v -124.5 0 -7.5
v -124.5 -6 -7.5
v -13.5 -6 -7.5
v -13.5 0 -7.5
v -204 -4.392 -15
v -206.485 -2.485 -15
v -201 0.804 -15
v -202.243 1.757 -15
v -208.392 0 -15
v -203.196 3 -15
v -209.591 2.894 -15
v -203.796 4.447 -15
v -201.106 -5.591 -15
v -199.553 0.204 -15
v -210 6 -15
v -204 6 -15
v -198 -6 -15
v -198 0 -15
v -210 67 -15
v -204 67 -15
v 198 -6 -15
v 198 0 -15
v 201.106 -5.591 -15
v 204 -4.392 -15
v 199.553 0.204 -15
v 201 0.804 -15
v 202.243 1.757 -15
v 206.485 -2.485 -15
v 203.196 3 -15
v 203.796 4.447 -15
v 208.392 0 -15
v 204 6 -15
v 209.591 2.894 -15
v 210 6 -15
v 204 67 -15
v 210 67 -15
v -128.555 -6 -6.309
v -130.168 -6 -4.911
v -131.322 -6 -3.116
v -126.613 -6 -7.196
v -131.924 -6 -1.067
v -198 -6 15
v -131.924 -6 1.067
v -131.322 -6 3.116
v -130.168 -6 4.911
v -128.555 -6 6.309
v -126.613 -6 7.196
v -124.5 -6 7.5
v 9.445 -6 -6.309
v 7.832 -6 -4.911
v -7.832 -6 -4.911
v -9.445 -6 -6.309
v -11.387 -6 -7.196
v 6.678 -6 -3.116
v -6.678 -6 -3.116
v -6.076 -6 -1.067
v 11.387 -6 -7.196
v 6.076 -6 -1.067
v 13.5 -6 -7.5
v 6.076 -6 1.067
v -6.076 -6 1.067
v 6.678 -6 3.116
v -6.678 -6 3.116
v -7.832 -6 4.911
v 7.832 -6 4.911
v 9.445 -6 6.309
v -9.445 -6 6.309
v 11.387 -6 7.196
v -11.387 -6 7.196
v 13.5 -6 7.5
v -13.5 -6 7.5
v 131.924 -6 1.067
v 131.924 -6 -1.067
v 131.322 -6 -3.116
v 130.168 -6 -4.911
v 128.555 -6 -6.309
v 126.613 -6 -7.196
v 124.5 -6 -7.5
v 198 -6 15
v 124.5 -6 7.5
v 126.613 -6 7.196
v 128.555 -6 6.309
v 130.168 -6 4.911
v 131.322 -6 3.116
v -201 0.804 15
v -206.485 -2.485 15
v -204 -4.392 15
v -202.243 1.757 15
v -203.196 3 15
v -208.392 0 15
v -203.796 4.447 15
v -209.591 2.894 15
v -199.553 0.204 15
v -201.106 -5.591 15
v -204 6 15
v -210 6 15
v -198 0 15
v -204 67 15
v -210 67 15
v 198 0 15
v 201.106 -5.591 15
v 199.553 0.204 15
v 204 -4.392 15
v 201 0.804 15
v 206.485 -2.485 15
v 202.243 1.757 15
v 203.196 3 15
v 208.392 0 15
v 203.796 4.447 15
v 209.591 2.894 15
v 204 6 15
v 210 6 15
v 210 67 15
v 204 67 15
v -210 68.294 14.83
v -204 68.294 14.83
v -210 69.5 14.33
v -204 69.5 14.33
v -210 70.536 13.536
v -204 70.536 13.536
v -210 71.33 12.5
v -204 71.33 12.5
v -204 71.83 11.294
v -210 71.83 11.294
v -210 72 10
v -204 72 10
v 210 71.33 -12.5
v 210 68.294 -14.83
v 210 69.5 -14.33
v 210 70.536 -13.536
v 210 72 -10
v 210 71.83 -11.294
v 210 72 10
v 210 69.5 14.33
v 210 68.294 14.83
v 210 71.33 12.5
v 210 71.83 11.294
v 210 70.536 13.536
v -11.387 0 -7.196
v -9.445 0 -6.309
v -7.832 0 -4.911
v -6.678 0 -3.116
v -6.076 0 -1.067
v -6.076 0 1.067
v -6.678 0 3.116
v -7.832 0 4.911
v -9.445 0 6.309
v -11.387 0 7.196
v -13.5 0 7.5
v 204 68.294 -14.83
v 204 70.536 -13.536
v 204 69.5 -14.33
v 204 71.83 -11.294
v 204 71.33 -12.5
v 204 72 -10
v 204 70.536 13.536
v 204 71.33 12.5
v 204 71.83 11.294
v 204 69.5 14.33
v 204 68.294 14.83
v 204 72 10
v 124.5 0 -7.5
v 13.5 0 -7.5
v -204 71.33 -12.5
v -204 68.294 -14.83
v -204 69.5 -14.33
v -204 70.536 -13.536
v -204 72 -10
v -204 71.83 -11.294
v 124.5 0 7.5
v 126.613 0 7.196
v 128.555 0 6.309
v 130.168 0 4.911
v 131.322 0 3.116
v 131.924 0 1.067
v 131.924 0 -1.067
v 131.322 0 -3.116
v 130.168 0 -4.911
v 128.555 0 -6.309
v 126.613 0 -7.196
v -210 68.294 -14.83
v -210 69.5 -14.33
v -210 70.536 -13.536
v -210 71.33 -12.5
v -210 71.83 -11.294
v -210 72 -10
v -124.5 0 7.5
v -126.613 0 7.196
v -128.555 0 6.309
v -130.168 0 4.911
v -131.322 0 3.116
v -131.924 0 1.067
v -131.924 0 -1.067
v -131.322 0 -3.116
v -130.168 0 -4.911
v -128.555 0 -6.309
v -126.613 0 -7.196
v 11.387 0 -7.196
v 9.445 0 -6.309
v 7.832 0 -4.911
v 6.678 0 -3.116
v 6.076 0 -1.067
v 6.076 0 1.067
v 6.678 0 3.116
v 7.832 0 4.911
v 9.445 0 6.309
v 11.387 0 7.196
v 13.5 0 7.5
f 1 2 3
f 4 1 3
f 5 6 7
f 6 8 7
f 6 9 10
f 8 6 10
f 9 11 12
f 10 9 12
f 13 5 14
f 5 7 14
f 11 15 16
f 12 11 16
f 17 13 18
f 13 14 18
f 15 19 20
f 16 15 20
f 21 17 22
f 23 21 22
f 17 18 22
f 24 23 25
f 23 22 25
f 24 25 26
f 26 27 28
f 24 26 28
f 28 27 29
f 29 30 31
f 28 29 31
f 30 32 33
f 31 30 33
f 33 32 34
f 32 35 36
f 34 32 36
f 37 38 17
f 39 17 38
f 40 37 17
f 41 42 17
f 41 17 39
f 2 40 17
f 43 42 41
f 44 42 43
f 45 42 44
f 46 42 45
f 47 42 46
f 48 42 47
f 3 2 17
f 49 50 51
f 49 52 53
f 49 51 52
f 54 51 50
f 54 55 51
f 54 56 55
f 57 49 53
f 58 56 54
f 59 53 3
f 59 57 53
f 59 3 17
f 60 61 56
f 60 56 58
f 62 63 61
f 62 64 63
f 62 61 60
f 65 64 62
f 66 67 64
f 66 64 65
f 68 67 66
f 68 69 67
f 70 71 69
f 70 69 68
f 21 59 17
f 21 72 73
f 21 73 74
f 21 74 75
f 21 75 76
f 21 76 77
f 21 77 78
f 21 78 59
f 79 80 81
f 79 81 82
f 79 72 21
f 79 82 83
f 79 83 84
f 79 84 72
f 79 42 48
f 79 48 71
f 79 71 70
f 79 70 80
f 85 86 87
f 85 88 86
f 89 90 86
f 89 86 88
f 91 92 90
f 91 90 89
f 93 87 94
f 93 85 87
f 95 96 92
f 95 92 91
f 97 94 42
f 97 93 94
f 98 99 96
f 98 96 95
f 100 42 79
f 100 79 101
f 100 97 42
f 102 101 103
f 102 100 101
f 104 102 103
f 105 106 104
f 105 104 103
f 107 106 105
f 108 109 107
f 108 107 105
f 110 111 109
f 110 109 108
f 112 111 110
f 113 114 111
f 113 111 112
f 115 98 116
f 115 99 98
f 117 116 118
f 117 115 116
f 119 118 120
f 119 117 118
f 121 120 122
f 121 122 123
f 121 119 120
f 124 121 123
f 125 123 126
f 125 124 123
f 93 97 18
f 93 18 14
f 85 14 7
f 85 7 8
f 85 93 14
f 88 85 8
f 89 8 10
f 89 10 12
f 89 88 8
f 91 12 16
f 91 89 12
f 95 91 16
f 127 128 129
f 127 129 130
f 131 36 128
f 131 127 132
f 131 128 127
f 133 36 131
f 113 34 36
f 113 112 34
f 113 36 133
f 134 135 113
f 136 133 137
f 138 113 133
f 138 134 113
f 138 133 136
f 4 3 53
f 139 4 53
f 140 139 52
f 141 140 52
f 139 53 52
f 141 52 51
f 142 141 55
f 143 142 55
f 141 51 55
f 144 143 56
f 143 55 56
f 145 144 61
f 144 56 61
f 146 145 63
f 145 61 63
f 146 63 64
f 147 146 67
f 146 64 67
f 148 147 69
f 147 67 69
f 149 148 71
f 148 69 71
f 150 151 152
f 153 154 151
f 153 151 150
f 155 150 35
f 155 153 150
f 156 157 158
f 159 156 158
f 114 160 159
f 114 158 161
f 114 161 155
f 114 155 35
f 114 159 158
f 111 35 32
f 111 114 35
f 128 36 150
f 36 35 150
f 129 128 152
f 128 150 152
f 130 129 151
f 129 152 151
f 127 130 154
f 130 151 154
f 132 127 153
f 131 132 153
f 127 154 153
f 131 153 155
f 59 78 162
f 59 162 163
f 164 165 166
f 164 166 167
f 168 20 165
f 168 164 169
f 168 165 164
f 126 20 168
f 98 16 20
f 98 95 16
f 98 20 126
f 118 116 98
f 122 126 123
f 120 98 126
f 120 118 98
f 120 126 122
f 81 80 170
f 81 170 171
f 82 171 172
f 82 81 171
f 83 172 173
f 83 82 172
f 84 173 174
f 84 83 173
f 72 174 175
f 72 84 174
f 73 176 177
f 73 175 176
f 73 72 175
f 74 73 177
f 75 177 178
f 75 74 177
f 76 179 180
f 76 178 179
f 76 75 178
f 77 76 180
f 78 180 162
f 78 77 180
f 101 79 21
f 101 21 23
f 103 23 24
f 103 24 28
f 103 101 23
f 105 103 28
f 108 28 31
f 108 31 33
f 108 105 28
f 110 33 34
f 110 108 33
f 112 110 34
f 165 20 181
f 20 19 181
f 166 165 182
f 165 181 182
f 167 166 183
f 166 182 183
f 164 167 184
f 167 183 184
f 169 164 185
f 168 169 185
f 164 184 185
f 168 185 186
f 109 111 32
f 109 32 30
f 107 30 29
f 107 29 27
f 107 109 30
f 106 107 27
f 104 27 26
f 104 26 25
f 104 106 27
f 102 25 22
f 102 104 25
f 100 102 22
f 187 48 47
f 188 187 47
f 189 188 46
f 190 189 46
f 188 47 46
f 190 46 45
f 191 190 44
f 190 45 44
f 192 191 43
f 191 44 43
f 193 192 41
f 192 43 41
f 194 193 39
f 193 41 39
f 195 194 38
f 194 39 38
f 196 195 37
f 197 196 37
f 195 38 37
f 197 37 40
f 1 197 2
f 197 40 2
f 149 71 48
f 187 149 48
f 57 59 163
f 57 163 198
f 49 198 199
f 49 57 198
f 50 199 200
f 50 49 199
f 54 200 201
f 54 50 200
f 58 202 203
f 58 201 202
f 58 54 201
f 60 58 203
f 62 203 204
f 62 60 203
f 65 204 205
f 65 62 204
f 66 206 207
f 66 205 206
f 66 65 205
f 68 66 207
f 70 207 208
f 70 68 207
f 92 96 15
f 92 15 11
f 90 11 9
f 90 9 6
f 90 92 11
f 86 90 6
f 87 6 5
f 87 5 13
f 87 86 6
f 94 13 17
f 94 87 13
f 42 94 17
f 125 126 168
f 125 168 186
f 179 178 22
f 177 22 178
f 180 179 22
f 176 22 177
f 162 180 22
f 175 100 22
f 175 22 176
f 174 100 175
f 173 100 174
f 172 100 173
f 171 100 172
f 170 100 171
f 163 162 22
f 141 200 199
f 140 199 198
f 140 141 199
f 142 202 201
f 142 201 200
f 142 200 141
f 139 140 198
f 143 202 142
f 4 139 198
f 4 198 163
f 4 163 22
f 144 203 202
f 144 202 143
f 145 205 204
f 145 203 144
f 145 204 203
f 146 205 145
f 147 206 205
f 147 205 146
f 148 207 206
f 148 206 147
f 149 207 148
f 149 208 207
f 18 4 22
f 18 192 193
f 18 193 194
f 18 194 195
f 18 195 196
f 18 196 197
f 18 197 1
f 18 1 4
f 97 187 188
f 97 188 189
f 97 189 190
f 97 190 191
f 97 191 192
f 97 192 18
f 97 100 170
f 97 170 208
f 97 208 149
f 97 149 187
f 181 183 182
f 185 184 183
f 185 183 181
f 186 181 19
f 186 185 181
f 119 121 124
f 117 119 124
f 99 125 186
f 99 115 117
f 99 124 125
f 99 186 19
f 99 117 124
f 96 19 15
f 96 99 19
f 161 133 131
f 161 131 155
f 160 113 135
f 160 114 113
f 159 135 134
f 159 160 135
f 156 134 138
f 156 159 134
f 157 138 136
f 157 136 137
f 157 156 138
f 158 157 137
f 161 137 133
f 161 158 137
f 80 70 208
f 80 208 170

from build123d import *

# Parameters (mm, degrees)
SM_BASE_FLANGE_1_DEPTH = 15
CUT_EXTRUDE_1_DEPTH    = 10
FILLET_1_R             = 5


# Sheet-metal steps are written as plain solids
with BuildPart() as part:
    # Sketch 1 → 基体-法兰1 (new, symmetric)
    with BuildSketch(Plane.XY):
        with BuildLine():
            Line((204, 72), (204, 6))
            ThreePointArc((204, 6), (202.242640687, 1.757359313), (198, 0))
            Line((198, 0), (-198, 0))
            ThreePointArc((-198, 0), (-202.242640687, 1.757359313), (-204, 6))
            Line((-204, 6), (-204, 72))
            Line((-204, 72), (-210, 72))
            Line((-210, 72), (-210, 6))
            ThreePointArc((-210, 6), (-206.485281374, -2.485281374), (-198, -6))
            Line((-198, -6), (198, -6))
            ThreePointArc((198, -6), (206.485281374, -2.485281374), (210, 6))
            Line((210, 6), (210, 72))
            Line((210, 72), (204, 72))
        make_face()
    extrude(amount=SM_BASE_FLANGE_1_DEPTH, both=True)

    # 草图6 → 切除-拉伸1 (cut)
    with BuildSketch(Plane.XZ.offset(6)):
        with BuildLine():
            Line((13.5, 7.5), (124.5, 7.5))
            ThreePointArc((124.5, 7.5), (132, 0), (124.5, -7.5))
            Line((124.5, -7.5), (13.5, -7.5))
            ThreePointArc((13.5, -7.5), (6, 0), (13.5, 7.5))
        make_face()
        with BuildLine():
            Line((-13.5, 7.5), (-124.5, 7.5))
            ThreePointArc((-124.5, 7.5), (-132, 0), (-124.5, -7.5))
            Line((-124.5, -7.5), (-13.5, -7.5))
            ThreePointArc((-13.5, -7.5), (-6, 0), (-13.5, 7.5))
        make_face()
    extrude(amount=-CUT_EXTRUDE_1_DEPTH, mode=Mode.SUBTRACT)

    # 圆角1
    fillet_1_edges = [part.edges().sort_by_distance(p)[0] for p in [
        (-207, 72, -15),
        (207, 72, -15),
        (-207, 72, 15),
        (207, 72, 15),
    ]]
    fillet(fillet_1_edges, radius=FILLET_1_R)


solid = part.part
